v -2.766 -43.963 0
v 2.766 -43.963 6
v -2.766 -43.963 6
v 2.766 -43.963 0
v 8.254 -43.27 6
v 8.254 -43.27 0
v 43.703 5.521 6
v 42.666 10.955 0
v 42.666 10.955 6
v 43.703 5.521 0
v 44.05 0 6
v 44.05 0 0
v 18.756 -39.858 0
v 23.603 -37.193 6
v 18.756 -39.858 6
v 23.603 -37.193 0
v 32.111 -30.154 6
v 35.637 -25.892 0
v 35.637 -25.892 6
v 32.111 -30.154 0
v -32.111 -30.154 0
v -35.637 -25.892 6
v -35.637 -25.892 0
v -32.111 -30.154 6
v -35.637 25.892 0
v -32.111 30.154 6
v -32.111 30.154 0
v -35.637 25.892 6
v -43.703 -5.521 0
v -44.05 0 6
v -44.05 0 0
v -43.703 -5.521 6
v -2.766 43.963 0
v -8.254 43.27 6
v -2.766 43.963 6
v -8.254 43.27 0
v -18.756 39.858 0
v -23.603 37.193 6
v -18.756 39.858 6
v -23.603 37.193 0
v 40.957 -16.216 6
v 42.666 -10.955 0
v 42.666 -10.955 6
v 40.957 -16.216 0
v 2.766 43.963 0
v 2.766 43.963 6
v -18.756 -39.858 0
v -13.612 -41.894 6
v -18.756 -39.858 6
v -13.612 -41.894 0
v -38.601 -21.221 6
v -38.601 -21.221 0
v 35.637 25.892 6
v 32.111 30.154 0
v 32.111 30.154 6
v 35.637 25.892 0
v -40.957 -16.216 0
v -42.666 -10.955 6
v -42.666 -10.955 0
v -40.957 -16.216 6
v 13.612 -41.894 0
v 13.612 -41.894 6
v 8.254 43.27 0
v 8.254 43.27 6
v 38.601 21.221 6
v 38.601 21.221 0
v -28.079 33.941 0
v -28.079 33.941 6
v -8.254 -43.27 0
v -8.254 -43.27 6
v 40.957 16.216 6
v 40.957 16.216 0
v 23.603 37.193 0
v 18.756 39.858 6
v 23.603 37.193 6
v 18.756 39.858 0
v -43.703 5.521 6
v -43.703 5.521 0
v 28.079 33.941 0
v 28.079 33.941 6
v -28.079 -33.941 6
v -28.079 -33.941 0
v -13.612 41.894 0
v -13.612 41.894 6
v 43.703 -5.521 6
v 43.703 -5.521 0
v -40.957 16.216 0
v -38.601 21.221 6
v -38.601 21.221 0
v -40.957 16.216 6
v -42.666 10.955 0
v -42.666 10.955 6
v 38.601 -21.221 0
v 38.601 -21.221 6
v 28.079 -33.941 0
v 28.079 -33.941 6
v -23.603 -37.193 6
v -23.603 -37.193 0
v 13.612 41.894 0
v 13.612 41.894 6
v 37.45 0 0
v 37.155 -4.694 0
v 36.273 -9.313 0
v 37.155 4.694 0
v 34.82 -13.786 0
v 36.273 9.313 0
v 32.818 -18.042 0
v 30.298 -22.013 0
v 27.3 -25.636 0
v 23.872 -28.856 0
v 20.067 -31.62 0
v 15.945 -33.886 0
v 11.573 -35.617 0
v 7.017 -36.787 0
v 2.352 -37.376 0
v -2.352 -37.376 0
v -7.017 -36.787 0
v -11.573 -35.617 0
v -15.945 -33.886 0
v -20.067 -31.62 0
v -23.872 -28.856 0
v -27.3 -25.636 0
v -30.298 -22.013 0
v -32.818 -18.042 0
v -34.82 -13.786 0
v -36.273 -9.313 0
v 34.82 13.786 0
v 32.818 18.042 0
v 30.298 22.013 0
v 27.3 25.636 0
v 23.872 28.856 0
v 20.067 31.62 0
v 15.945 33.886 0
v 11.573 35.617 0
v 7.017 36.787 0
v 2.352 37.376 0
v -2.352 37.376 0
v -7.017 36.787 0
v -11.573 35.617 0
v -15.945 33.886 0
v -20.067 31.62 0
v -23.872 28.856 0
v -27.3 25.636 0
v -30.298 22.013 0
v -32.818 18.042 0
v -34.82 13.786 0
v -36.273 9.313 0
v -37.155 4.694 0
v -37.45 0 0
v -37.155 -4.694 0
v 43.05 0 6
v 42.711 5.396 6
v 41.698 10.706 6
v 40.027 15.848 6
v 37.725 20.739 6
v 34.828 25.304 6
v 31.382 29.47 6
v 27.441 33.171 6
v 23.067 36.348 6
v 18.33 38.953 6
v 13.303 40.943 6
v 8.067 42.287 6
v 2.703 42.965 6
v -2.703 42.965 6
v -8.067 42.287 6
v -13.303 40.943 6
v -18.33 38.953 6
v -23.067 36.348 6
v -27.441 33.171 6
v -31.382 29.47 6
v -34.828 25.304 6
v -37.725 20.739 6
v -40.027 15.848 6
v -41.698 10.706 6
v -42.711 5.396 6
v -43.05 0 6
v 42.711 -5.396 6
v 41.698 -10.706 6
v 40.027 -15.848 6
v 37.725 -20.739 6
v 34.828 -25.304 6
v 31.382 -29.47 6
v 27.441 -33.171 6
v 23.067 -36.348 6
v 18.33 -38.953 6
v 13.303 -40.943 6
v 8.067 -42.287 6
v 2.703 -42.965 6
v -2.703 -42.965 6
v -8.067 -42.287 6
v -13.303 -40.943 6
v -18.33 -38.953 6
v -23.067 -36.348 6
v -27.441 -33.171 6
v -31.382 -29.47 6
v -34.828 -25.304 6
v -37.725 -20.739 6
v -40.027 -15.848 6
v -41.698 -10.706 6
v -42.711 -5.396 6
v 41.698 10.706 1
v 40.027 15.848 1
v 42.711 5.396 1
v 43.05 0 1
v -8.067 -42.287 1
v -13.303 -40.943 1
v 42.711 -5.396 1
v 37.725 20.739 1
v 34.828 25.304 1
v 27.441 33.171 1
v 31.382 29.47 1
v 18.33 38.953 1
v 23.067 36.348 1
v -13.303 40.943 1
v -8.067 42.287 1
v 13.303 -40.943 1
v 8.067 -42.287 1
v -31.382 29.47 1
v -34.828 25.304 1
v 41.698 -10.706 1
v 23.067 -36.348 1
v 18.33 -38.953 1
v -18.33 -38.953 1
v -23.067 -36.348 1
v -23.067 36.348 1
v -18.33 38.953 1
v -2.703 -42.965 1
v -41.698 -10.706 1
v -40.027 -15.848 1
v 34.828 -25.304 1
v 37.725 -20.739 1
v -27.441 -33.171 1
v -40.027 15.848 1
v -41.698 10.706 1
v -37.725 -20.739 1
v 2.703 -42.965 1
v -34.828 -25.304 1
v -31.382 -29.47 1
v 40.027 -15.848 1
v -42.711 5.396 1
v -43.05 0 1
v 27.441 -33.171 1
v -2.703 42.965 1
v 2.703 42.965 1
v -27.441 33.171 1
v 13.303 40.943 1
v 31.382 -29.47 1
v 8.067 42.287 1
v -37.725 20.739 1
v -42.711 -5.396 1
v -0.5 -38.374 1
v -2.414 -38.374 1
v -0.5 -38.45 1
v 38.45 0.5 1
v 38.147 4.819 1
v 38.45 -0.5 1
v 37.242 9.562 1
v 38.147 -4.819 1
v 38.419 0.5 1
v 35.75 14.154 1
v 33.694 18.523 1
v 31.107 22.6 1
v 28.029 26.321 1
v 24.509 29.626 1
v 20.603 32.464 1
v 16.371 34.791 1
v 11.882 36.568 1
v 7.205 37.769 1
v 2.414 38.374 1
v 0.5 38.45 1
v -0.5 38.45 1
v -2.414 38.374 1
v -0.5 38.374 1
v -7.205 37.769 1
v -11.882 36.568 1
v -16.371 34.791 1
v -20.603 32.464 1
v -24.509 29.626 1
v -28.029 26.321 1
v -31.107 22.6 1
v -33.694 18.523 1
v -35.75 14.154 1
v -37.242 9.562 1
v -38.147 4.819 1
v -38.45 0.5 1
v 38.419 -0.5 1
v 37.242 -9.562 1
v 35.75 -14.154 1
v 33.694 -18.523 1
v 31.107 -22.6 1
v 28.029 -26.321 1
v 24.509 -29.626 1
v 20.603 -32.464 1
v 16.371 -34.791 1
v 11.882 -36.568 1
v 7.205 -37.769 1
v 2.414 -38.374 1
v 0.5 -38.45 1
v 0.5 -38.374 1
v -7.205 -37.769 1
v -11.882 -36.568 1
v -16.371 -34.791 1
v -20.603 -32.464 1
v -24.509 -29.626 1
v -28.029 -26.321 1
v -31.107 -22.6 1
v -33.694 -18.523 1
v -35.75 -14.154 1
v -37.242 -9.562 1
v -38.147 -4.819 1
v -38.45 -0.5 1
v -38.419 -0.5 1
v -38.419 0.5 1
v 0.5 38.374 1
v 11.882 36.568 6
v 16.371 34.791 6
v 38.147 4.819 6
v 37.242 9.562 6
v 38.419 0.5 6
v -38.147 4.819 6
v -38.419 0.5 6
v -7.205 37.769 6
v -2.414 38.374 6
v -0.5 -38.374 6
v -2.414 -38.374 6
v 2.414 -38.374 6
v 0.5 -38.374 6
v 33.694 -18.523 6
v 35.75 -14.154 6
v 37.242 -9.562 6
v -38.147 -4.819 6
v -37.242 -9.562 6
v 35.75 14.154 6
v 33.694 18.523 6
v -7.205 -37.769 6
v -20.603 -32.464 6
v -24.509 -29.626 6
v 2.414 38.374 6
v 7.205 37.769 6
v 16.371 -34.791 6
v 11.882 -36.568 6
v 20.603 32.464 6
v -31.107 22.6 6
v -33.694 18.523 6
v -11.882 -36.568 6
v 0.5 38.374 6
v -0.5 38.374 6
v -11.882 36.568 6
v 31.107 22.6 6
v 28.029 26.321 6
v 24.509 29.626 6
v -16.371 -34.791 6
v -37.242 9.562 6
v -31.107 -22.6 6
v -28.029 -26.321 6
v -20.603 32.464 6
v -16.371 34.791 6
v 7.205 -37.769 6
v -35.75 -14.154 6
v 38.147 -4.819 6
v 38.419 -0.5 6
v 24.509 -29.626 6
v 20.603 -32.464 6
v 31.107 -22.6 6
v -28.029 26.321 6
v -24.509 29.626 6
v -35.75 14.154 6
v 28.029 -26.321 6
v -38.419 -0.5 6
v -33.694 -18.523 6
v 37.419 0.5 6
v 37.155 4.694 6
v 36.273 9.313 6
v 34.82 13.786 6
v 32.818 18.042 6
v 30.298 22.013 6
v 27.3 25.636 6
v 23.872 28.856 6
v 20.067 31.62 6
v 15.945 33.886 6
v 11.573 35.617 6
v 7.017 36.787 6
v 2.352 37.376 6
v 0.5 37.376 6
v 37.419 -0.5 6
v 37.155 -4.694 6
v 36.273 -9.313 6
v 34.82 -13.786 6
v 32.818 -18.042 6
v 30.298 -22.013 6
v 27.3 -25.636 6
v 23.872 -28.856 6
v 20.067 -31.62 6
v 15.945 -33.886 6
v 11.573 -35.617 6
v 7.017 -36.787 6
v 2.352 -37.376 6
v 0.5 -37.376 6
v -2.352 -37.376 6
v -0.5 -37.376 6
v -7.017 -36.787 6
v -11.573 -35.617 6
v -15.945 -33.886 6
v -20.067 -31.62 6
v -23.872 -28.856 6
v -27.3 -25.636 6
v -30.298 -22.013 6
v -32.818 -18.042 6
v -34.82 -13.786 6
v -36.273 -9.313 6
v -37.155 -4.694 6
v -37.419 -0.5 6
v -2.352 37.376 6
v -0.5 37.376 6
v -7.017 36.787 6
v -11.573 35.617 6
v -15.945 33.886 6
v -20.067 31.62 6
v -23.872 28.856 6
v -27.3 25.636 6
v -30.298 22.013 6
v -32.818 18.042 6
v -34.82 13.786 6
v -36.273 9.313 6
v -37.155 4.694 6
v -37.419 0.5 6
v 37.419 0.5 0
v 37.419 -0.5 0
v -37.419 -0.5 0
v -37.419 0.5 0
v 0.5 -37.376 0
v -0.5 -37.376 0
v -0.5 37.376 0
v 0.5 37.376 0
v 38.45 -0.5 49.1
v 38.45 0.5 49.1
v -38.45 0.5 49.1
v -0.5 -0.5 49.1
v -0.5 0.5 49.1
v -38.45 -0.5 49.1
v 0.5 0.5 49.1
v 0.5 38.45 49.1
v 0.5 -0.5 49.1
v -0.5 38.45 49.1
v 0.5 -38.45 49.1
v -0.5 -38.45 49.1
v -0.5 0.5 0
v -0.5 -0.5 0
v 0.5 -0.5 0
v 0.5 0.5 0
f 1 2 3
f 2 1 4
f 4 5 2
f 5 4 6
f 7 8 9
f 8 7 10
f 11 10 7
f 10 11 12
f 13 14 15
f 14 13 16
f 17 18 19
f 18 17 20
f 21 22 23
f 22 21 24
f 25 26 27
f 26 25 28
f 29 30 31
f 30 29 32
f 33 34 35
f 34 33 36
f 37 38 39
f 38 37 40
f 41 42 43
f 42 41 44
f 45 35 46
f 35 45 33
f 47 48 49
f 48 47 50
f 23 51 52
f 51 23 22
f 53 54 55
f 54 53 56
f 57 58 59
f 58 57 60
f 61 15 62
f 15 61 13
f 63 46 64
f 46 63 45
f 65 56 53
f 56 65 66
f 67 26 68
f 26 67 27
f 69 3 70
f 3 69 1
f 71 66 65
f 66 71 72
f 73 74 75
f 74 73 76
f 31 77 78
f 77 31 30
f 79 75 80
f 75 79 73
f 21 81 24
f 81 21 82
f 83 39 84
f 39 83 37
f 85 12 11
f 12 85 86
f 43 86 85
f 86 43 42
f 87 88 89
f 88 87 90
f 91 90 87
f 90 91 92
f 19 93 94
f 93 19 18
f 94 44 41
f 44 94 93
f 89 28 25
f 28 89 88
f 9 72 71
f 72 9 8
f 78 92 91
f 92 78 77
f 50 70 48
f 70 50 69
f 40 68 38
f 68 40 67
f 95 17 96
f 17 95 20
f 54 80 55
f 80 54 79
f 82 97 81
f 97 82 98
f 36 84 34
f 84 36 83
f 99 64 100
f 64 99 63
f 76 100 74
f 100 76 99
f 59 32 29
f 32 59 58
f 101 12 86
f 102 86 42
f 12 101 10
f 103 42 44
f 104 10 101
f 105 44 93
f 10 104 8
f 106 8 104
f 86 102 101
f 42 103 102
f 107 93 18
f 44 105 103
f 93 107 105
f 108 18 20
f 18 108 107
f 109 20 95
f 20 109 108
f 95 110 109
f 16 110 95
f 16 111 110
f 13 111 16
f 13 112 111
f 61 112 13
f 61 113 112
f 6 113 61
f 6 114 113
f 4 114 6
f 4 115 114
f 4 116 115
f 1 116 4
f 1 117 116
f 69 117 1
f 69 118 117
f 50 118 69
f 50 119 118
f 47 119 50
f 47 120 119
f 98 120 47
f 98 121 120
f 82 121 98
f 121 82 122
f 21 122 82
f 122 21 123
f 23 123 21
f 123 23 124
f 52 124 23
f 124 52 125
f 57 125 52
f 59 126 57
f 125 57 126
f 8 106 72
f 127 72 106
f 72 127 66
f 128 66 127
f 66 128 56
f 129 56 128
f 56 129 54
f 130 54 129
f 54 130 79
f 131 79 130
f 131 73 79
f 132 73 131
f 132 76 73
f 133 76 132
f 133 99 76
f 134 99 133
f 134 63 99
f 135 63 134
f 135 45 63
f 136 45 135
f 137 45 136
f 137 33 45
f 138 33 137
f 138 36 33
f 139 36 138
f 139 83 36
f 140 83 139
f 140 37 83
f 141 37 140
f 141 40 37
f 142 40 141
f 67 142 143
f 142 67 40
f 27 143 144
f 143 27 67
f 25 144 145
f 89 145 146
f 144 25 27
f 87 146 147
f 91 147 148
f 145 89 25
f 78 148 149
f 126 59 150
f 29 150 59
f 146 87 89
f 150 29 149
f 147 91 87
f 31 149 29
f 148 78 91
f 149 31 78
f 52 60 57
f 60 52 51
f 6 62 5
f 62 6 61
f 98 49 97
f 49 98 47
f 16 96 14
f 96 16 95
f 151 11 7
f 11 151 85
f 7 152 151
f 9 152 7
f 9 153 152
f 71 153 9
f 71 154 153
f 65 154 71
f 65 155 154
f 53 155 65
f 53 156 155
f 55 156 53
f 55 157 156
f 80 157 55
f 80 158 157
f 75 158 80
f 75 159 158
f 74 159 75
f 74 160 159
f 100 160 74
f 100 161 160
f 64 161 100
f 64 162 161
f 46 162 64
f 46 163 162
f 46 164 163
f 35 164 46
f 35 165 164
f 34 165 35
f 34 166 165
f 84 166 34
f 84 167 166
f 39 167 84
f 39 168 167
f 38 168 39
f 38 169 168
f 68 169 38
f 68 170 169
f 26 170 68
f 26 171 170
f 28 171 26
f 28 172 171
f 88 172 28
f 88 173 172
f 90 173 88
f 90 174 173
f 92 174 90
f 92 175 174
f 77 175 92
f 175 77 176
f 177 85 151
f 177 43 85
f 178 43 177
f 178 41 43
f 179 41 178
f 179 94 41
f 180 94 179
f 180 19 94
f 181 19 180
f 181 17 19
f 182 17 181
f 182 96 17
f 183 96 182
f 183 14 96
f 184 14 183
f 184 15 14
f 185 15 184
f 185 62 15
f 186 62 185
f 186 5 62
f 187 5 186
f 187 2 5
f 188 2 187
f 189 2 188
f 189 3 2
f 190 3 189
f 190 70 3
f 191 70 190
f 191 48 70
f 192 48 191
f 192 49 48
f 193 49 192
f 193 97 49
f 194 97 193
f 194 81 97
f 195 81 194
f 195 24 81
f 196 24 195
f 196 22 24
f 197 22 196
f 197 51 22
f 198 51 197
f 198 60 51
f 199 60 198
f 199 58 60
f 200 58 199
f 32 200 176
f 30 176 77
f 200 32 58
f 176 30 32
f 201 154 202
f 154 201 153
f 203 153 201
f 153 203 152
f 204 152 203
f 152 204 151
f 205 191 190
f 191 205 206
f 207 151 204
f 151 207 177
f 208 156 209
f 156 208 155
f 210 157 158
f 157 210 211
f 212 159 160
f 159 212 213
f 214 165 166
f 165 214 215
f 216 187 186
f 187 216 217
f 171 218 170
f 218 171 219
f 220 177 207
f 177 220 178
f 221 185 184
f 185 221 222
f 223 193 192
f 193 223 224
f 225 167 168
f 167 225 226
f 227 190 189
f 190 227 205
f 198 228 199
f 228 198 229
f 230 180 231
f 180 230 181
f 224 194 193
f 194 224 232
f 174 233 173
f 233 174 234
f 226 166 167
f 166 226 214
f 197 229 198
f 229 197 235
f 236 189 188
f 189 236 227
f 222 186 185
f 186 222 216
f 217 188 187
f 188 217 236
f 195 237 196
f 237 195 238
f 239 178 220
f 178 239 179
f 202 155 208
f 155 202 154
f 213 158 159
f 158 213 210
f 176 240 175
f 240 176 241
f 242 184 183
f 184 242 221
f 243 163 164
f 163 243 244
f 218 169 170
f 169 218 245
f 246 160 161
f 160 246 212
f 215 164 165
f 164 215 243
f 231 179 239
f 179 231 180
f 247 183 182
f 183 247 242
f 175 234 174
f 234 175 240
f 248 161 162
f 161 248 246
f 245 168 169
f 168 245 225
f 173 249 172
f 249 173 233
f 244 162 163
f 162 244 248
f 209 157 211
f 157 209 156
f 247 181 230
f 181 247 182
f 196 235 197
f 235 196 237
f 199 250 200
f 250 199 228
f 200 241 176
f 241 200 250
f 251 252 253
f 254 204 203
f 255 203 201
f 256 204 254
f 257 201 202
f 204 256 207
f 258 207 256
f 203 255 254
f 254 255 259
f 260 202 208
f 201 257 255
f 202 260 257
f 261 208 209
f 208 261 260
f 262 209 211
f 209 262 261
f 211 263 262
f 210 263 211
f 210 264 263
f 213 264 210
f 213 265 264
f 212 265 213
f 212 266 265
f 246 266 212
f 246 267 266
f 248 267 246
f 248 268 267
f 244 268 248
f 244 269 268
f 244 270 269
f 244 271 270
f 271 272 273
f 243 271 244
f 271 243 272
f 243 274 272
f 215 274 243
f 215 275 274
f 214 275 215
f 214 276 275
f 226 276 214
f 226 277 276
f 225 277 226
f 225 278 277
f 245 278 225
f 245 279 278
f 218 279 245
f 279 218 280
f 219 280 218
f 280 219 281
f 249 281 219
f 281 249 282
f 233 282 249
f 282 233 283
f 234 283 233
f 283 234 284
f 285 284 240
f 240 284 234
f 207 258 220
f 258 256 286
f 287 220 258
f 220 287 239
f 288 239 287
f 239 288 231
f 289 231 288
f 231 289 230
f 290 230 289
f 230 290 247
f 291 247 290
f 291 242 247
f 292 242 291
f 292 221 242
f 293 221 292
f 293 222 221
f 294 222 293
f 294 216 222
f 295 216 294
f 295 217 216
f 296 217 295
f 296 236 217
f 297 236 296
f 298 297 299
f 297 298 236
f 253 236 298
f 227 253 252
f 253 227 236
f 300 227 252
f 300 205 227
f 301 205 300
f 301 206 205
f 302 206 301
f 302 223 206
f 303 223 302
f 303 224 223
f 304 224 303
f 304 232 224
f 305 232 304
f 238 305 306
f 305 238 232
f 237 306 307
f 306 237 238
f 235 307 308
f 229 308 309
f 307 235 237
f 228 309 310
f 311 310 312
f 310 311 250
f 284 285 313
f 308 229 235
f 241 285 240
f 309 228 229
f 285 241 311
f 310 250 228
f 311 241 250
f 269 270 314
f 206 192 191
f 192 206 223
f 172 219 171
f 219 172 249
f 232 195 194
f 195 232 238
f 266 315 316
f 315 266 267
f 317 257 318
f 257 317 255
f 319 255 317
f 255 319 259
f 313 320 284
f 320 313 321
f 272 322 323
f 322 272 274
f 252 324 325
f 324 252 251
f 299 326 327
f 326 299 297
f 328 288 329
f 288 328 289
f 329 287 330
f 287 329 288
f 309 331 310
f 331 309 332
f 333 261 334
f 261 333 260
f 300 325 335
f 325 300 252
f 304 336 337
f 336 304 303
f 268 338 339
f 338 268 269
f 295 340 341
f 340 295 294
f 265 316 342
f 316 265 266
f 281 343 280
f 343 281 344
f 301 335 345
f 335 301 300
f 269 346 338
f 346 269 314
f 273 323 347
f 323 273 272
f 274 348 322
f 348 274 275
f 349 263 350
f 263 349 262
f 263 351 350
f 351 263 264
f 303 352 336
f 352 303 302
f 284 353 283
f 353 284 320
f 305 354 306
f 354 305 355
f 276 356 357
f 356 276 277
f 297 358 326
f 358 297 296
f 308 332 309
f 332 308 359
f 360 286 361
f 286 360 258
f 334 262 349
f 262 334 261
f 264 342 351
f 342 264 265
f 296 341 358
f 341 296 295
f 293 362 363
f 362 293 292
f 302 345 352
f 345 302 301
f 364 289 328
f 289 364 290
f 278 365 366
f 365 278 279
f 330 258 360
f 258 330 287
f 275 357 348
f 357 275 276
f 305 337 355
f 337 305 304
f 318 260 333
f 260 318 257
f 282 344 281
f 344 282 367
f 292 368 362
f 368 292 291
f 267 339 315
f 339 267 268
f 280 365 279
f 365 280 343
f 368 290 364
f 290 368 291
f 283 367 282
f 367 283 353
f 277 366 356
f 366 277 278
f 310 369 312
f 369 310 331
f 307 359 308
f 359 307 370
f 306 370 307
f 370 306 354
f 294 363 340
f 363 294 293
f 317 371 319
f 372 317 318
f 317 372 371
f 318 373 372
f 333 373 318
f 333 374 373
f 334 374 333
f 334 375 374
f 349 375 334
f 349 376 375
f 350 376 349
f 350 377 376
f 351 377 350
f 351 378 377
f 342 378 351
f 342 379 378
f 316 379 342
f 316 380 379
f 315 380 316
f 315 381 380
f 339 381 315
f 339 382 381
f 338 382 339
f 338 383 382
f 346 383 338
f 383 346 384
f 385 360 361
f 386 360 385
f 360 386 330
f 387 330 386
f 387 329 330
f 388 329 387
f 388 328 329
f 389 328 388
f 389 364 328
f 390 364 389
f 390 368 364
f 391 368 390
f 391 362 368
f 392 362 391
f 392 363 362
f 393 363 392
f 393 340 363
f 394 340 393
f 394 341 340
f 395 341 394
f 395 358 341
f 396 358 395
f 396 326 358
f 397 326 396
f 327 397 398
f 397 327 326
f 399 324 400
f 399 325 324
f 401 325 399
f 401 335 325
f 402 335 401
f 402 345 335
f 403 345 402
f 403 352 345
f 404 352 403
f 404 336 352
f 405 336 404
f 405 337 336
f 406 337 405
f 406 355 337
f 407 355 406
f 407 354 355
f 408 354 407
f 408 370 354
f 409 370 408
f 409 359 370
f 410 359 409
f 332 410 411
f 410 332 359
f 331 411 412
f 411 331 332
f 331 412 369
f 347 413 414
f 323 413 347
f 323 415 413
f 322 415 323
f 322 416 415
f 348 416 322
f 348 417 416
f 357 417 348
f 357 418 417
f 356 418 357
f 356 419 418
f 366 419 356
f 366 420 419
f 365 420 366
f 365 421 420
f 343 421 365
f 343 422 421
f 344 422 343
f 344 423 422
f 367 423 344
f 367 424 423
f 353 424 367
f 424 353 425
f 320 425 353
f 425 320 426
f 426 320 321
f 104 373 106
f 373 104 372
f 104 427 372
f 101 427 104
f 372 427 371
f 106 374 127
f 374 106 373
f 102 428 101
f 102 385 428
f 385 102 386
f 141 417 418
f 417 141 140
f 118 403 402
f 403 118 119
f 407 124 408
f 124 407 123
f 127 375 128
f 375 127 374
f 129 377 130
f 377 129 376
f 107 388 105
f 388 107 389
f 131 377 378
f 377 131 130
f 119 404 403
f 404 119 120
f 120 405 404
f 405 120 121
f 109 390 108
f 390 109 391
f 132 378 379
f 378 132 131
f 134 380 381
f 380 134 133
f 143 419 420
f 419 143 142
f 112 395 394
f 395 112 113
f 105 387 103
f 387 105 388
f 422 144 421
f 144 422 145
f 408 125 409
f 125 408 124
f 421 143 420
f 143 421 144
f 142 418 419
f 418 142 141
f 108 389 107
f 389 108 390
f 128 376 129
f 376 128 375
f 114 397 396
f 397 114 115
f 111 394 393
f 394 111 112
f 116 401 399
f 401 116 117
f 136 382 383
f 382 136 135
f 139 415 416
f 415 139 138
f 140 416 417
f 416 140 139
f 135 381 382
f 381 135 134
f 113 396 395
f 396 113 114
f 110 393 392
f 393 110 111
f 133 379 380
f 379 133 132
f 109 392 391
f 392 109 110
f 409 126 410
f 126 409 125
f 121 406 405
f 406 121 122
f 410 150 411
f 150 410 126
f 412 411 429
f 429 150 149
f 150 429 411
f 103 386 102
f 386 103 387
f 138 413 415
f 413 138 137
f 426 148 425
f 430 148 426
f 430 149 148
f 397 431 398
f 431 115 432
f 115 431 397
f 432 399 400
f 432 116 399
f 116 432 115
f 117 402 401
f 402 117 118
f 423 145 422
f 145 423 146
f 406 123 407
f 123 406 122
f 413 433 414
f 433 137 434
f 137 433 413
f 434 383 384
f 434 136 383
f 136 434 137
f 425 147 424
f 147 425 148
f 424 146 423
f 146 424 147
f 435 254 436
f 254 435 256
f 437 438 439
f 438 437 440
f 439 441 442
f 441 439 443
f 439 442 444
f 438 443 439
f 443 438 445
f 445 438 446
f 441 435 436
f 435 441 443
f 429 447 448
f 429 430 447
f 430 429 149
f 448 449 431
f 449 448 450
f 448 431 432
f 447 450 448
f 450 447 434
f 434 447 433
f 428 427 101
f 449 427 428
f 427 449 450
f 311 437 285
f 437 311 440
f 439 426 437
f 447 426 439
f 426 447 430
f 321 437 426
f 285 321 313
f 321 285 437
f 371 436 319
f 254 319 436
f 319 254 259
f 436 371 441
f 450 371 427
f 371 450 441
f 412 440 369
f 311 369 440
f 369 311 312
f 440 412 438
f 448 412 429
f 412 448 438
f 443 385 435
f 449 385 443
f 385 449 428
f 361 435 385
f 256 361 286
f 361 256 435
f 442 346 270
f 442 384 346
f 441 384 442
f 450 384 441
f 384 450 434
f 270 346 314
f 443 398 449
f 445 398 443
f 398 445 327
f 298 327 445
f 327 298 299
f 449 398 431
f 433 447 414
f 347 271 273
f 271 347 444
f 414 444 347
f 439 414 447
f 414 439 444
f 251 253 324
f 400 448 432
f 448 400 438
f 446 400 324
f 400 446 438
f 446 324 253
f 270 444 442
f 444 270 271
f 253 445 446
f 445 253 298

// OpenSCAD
// all measurements are in millimeters (mm)

// tolerance added to every hole diameter (mm)
tol = 0.6;		

// wall thickness (mm)
wt 		= 1.0; 	

// pipe/can outer diameter (mm)
d1 = 85.5;		
d1t = d1 + tol;	

// pipe/can inner diameter (mm)
d2 = 77.5;
d2t = d2 - tol;		

// outer length (mm)
l1 = 6.0;	
	
// inner length (mm)		
l2 = 6.0; 

// make cap?
makeCap = "no"; // [yes,no]

// make holes?
makeHoles = "no"; // [yes,no]

// dividers height (zero -> no dividers)
dh = 49.1;

// holes diameter (mm)		
hd = 4.0; // [4:12]

// difference in holes and solids to prevent (visual) glitches (mm)
e = 0.02*1;		

// smoothness
$fn = 50;	

module outerSolid()
{
	cylinder(d=d1t+2*wt,h=l1);
}

module outerHole()
{
	translate([0,0,wt]) cylinder(d=d1t,h=l1+2*e);
}

module innerSolid()
{
	cylinder(d=d2t,h=l1);
}

module innerHole()
{
	translate([0,0,-e			]) cylinder(d=d2t-2*wt,h=l1+2*e);
}

module holes()
{
	pi = 3.14159*1;
	m = floor(0.7*d2t/(1.1*hd+3));
	s = 0.53*d2t/m;
	for(i=[0:m-1])
	{
		d2 = i*s;
		k = 1+floor(2*pi * d2 / (1.2*hd+2)); 
		s2 = 360/k;
		for(j=[0:k])
		{
			rotate([0,0,i*s2/2+j*s2]) 
				translate([d2,0,-e])
					cylinder(d=hd,h=wt+2*e,$fn=3+5*hd);
		}
	}
}

union()
{
	difference()
	{
		union()
		{
			innerSolid();
			difference()
			{
				outerSolid();
				outerHole();
			}
		}
		innerHole();
	}	
	if(makeCap=="yes") 
	{
		difference()
		{
			
			cylinder(d=d2t-2*wt+2*e,h=wt);
			if(makeHoles=="yes") holes();
		}
	}
	if(dh>0.01)
	{
		translate([0,0,dh/2])
		{
			cube([d2t,wt,dh],center=true);
			cube([wt,d2t,dh],center=true);
		}
	}
}
